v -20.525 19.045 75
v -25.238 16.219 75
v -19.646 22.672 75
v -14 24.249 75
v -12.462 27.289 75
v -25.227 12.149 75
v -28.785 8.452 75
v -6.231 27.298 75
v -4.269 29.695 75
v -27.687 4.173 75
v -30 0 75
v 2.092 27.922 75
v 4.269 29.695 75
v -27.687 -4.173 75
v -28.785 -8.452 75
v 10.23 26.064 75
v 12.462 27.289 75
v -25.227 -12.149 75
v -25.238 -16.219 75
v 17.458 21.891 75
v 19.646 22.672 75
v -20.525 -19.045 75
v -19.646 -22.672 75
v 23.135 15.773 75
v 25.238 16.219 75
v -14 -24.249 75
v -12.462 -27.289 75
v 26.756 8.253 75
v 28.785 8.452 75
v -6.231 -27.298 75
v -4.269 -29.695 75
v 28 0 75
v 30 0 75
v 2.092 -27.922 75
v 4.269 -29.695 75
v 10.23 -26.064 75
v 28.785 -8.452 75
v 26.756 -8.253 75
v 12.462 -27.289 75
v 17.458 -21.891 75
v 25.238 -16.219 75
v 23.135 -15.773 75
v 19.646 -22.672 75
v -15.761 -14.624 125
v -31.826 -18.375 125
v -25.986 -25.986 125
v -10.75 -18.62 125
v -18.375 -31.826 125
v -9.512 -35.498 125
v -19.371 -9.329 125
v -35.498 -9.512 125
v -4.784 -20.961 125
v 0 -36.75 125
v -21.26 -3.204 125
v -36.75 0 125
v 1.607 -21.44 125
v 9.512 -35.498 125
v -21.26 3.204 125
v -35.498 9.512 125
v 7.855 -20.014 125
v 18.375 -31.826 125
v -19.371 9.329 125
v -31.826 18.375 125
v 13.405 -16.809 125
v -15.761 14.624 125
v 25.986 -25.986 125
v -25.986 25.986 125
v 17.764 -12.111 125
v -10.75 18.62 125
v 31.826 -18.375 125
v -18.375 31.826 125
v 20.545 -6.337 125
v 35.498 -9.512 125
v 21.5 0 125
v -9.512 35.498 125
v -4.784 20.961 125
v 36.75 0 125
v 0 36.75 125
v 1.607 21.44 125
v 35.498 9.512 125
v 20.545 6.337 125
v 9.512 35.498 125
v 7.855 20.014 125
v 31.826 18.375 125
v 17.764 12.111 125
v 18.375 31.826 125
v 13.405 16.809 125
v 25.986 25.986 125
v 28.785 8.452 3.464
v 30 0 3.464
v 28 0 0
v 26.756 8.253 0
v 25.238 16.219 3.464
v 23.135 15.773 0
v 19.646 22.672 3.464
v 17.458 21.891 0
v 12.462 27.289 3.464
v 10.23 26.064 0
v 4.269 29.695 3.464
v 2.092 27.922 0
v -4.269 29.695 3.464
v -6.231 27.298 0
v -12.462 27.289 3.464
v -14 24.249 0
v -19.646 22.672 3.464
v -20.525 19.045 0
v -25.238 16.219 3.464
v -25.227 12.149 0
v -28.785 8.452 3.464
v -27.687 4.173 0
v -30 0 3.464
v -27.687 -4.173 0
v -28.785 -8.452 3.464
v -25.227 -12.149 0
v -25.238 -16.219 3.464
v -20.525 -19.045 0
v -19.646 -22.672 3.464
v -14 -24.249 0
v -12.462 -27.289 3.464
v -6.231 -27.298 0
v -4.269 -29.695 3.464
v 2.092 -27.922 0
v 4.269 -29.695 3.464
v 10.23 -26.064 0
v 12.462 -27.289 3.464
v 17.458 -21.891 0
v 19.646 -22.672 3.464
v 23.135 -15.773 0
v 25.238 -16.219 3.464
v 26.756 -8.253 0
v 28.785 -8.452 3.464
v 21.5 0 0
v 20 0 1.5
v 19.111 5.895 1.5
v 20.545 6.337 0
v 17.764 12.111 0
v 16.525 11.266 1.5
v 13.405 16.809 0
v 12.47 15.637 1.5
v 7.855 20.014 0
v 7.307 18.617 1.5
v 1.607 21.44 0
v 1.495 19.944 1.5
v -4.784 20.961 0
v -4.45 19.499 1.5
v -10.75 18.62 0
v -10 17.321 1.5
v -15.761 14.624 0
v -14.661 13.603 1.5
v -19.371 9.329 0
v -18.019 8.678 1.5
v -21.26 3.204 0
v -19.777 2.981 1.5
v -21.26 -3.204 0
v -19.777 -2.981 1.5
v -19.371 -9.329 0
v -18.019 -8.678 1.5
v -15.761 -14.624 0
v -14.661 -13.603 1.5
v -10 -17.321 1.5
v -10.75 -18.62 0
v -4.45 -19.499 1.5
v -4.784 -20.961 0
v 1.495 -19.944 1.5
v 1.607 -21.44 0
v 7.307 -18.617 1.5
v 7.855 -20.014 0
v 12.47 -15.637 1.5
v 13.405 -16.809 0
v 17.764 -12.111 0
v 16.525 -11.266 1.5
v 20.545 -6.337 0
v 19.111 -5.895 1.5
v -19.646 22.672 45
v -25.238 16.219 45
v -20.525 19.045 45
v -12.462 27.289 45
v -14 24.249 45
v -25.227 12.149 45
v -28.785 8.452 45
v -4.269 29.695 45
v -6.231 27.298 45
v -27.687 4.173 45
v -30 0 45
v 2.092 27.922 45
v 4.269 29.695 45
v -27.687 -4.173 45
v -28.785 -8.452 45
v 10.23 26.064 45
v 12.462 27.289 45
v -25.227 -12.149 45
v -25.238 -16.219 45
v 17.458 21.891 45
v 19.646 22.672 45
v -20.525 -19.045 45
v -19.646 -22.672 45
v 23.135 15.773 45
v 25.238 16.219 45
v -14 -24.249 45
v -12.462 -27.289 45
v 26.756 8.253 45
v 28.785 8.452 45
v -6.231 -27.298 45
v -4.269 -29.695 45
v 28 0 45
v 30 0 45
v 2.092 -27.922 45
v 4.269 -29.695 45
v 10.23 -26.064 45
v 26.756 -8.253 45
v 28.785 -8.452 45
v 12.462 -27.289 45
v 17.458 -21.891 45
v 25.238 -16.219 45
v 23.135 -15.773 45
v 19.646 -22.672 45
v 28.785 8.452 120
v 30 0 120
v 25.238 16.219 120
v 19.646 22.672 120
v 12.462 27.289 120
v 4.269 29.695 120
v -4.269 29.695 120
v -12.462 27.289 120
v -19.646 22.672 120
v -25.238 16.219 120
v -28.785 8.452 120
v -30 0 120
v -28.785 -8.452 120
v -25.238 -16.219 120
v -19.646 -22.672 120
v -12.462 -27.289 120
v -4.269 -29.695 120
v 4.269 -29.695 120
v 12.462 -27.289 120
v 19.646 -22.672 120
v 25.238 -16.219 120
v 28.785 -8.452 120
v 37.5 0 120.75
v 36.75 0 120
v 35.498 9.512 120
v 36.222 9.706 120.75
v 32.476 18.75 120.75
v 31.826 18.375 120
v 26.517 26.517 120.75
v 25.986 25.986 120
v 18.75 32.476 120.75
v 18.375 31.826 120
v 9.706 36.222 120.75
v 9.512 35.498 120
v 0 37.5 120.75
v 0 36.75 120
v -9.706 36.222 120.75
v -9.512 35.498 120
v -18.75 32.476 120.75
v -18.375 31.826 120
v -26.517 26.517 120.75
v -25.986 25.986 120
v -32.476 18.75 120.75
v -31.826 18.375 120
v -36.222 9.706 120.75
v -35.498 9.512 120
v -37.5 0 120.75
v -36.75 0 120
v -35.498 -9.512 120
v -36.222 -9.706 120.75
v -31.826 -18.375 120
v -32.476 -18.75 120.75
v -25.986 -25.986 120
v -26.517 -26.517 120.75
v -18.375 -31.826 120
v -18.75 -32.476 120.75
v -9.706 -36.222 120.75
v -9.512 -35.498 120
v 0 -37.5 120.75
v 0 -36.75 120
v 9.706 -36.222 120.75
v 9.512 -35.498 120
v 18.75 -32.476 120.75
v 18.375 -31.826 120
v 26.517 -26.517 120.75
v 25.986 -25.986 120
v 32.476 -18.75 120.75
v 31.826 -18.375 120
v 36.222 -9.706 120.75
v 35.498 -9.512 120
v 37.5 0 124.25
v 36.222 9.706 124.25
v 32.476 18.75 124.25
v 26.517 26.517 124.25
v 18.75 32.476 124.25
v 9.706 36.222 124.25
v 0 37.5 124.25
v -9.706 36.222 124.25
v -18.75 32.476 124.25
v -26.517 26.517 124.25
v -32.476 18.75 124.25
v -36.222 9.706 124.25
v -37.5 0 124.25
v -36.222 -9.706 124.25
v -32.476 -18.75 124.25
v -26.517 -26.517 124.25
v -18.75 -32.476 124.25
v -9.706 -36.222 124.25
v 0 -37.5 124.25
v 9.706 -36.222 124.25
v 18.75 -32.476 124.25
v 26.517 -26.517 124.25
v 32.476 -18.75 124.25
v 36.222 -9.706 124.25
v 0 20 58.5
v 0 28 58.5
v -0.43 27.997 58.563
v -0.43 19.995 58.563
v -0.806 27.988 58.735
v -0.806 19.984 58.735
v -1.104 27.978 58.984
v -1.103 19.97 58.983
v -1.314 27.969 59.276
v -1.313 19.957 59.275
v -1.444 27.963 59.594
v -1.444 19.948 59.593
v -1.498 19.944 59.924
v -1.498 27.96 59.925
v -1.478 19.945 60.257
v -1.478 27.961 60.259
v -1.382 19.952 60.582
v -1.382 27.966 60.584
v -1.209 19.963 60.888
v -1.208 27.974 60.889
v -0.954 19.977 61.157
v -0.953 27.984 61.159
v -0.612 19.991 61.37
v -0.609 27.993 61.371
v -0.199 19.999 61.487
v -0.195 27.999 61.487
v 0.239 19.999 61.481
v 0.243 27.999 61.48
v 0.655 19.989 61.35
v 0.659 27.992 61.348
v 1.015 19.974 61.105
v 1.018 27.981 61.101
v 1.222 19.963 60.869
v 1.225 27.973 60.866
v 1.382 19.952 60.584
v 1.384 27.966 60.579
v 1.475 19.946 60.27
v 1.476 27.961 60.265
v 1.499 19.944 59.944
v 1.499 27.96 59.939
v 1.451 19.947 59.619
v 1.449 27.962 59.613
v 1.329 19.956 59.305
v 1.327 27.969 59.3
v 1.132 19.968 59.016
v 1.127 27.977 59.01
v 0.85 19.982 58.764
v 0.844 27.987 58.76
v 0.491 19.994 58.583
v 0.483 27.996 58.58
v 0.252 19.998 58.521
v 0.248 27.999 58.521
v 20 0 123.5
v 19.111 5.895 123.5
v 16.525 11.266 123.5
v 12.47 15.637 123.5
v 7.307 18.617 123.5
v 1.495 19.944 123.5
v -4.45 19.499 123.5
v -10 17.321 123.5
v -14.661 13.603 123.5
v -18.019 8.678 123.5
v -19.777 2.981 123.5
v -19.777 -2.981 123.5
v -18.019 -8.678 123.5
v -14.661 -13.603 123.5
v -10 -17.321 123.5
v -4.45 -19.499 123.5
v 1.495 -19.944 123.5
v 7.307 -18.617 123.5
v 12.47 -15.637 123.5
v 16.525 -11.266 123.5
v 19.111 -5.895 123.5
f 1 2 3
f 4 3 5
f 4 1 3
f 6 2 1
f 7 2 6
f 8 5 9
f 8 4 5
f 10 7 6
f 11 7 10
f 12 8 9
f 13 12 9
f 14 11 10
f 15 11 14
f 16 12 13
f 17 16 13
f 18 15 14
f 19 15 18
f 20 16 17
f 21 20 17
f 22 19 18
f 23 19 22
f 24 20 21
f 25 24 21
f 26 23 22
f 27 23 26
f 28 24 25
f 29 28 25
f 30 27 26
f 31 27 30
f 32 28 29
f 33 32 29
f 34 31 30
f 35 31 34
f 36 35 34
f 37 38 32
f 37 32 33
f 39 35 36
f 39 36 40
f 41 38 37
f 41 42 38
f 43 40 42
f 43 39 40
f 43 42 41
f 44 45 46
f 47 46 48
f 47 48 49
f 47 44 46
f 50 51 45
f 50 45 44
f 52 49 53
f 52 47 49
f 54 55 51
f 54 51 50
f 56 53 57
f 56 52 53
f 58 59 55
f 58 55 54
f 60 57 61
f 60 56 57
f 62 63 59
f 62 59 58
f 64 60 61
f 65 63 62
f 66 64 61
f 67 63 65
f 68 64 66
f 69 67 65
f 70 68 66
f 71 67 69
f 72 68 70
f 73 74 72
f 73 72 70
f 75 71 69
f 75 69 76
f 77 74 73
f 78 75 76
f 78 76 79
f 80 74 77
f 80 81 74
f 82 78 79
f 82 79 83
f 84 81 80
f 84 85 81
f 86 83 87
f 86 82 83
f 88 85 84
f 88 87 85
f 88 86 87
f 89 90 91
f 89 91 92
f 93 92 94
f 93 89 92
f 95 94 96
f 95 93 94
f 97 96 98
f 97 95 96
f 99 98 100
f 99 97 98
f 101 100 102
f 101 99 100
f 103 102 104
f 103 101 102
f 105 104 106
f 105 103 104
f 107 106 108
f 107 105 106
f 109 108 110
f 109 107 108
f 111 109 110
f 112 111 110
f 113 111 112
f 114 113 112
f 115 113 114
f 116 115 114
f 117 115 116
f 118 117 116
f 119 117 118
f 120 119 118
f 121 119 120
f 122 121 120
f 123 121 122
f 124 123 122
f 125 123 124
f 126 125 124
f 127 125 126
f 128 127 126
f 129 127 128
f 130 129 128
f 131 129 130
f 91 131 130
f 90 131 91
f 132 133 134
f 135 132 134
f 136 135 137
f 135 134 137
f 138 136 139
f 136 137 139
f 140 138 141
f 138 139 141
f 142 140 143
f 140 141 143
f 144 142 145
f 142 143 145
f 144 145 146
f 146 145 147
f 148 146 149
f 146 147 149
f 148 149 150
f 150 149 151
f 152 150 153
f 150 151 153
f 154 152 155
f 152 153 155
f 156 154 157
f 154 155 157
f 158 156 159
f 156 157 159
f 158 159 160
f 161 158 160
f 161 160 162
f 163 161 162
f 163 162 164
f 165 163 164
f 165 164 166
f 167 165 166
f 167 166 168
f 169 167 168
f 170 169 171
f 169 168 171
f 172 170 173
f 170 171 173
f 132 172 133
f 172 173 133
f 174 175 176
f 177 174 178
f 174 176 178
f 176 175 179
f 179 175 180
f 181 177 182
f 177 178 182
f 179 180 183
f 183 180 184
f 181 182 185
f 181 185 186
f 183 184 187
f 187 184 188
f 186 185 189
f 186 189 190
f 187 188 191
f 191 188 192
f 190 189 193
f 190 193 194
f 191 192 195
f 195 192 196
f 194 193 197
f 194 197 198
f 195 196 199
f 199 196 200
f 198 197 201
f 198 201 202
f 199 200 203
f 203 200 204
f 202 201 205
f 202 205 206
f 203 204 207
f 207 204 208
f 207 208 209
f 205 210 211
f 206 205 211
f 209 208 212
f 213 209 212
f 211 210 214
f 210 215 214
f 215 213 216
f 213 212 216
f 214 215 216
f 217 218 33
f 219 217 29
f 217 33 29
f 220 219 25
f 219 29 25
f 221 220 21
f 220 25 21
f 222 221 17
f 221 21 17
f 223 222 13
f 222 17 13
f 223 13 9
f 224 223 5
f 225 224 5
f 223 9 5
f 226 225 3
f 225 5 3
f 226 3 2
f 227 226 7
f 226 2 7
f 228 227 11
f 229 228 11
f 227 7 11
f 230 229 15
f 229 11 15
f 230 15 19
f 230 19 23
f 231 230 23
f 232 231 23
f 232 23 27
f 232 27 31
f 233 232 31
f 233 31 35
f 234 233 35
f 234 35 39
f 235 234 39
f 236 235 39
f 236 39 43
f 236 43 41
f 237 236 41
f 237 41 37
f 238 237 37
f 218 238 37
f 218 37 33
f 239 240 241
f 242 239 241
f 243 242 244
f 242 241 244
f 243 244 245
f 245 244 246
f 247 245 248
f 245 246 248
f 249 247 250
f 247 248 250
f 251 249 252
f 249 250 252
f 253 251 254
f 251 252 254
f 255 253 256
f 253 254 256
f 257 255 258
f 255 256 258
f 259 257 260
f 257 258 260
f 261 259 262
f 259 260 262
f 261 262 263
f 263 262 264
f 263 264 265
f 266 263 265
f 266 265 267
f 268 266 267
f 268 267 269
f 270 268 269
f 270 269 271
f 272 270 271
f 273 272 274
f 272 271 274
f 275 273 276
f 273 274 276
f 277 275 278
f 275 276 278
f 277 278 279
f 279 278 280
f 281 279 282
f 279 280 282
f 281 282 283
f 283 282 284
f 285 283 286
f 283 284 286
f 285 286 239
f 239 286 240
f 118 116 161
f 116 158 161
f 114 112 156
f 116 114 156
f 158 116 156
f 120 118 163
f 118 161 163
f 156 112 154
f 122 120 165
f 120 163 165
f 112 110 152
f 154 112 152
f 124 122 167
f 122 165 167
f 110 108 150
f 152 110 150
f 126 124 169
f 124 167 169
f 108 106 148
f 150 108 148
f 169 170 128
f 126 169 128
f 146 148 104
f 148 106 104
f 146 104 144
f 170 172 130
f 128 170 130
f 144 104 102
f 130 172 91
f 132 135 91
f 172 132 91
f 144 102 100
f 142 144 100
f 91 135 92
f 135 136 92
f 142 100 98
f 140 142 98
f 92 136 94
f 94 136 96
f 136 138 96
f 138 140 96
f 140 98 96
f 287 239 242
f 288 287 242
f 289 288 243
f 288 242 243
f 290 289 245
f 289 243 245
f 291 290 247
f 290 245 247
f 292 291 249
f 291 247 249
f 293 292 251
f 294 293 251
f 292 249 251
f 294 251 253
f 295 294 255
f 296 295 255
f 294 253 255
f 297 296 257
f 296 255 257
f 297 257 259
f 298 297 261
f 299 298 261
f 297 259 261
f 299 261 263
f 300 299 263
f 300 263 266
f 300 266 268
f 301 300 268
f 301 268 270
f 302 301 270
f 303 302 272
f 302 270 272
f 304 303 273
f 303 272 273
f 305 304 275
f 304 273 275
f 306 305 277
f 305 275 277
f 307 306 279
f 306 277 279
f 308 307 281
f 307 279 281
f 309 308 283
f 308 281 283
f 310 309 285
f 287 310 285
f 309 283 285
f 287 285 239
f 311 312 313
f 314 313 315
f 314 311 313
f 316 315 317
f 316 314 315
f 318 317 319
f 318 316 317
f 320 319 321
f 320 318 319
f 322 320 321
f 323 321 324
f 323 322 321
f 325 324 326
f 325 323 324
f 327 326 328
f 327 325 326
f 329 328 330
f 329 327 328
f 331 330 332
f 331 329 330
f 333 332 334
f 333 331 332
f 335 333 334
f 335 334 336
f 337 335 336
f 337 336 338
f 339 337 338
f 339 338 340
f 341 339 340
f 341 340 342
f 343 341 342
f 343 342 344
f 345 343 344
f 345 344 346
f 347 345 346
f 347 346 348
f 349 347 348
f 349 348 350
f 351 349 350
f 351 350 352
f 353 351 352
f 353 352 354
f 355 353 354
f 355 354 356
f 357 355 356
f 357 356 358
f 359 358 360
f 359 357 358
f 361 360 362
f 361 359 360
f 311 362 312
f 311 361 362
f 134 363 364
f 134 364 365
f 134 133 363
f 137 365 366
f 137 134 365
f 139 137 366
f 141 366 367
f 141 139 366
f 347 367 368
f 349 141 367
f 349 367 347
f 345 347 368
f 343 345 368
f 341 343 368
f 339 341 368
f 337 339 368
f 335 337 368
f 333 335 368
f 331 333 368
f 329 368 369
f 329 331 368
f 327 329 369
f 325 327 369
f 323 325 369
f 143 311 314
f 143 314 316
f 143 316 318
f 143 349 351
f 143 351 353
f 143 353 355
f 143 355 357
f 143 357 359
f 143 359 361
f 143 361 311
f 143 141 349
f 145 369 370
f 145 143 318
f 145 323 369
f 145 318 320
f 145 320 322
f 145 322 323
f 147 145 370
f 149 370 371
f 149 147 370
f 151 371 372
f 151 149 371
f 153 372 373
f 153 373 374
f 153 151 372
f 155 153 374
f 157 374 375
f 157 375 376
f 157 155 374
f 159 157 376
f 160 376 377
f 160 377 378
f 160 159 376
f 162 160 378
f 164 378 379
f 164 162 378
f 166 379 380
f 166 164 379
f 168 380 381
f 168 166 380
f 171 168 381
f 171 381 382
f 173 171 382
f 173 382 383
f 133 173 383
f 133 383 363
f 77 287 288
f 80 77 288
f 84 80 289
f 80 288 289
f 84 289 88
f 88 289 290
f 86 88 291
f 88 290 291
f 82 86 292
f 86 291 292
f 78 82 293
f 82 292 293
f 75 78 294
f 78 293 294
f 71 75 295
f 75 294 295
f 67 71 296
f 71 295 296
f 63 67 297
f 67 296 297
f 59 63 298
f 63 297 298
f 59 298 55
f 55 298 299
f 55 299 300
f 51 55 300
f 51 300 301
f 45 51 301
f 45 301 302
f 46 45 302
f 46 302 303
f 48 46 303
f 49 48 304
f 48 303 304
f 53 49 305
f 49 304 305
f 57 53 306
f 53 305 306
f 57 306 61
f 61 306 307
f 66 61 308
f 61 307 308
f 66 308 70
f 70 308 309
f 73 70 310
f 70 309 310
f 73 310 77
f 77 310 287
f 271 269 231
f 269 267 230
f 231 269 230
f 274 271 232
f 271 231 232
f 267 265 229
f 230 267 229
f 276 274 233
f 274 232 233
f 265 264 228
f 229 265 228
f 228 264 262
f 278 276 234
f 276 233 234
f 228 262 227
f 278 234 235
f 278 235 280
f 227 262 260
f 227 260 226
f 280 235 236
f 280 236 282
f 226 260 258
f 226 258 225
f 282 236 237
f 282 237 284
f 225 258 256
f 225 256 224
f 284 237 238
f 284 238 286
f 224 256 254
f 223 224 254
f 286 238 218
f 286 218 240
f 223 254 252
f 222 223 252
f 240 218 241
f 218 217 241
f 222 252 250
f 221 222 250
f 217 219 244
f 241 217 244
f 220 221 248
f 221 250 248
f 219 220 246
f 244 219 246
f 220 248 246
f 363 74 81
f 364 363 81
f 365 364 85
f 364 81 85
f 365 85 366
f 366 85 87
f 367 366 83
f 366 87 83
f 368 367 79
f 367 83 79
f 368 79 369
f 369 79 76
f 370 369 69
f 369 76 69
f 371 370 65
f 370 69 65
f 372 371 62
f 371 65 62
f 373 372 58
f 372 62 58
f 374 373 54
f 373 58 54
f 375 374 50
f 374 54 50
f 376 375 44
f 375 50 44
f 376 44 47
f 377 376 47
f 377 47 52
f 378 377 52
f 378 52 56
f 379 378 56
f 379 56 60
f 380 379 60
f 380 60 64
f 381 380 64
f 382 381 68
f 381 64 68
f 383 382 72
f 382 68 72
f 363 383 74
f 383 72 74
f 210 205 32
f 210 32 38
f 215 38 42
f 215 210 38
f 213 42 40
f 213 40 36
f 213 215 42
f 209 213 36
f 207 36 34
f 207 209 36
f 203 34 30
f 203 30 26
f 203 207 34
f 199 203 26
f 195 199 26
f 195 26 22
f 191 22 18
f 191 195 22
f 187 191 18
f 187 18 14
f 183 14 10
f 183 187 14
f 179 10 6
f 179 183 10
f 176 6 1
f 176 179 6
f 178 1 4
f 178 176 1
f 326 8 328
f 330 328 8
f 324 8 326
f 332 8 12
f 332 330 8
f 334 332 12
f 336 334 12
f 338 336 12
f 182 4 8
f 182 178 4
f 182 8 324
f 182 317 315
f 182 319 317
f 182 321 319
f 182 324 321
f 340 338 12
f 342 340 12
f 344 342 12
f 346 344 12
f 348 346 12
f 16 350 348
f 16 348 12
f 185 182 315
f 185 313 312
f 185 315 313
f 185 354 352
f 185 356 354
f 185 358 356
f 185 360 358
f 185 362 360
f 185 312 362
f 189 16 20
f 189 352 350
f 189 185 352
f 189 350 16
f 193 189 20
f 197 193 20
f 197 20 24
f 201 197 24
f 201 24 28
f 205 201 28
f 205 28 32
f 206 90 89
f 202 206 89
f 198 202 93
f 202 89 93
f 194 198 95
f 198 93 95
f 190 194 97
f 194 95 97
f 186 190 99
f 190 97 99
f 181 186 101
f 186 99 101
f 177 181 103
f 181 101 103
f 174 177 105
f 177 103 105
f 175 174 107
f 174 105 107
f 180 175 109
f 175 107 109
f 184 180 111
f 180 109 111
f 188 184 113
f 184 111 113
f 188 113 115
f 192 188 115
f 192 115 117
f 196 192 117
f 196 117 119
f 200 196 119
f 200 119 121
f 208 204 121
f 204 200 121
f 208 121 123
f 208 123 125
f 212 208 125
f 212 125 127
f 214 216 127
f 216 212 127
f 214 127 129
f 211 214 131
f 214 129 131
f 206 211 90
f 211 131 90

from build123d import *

# Parameters (mm, degrees)
SKETCH1_R               = 30
SKETCH1_R_2             = 20
MAIN_BODY_DEPTH         = 120
SKETCH2_R               = 37.5
SKETCH2_R_2             = 20
BOSS_LIP_DEPTH          = 5
SKETCH4_W               = 4
SKETCH4_H               = 30
BEARLING_CHAMFER_SIZE   = 2
BEARLING_CHAMFER_SIZE2  = 3.464101615
SHAFT_CHAMFER_SIZE      = 1.5
LIP_CHAMFER_SIZE        = 0.75
CUT_EXTRUDE2_REACH      = 137.785
CUT_EXTRUDE2_END_RADIUS = 28
SKETCH5_R               = 1.5


with BuildPart() as part:
    # Sketch1 → Main Body (new body)
    with BuildSketch(Plane.XY):
        Circle(SKETCH1_R)
        Circle(SKETCH1_R_2, mode=Mode.SUBTRACT)
    extrude(amount=MAIN_BODY_DEPTH)

    # Sketch2 → Boss_Lip (add)
    with BuildSketch(Plane.XY.offset(120)):
        Circle(SKETCH2_R)
        Circle(SKETCH2_R_2, mode=Mode.SUBTRACT)
    extrude(amount=BOSS_LIP_DEPTH)

    # Sketch4 → Relief (revolve, cut)
    with BuildSketch(Plane(origin=(0, 0, 0), x_dir=(1, 0, 0), z_dir=(0, 1, 0)), mode=Mode.PRIVATE) as relief_sk:
        with Locations((-30, -60)):
            Rectangle(SKETCH4_W, SKETCH4_H)
    revolve(relief_sk.sketch.rotate(Axis((0, 0, 84), (0, 0, -1)), 180), axis=Axis((0, 0, 84), (0, 0, -1)), mode=Mode.SUBTRACT)

    # Bearling Chamfer
    bearling_chamfer_edges = [part.edges().sort_by_distance(p)[0] for p in [
        (-30, 0, 0),
    ]]
    bearling_chamfer_side = [part.faces().sort_by_distance(p)[0] for p in [
        (-29.151471863, 0, 0),
    ]]
    chamfer(bearling_chamfer_edges, length=BEARLING_CHAMFER_SIZE, length2=BEARLING_CHAMFER_SIZE2, reference=bearling_chamfer_side[0])

    # Shaft Chamfer
    shaft_chamfer_edges = [part.edges().sort_by_distance(p)[0] for p in [
        (-20, 0, 125),
        (-20, 0, 0),
    ]]
    chamfer(shaft_chamfer_edges, length=SHAFT_CHAMFER_SIZE)

    # Lip Chamfer
    lip_chamfer_edges = [part.edges().sort_by_distance(p)[0] for p in [
        (-37.5, 0, 120),
        (-37.5, 0, 125),
    ]]
    chamfer(lip_chamfer_edges, length=LIP_CHAMFER_SIZE)

    # Cut-Extrude2: up to this cylinder (the profile starts inside it)
    cut_extrude2_end = Plane(origin=(0, 0, 60), z_dir=(0, 0, 1)) * Cylinder(CUT_EXTRUDE2_END_RADIUS, 332.57, mode=Mode.PRIVATE)
    # Sketch5 → Cut-Extrude2 (cut, up to the surface)
    with BuildSketch(Plane(origin=(0, 0, 0), x_dir=(1, 0, 0), z_dir=(0, 1, 0)), mode=Mode.PRIVATE) as cut_extrude2_sk1:
        with Locations(Location((0, -60, 0), (0, 0, 90))):
            Circle(SKETCH5_R)
    cut_extrude2_tool1 = extrude(cut_extrude2_sk1.sketch, amount=CUT_EXTRUDE2_REACH, mode=Mode.PRIVATE) & cut_extrude2_end
    add(cut_extrude2_tool1.solids().sort_by_distance((0, 0, 60))[0], mode=Mode.SUBTRACT)


solid = part.part
